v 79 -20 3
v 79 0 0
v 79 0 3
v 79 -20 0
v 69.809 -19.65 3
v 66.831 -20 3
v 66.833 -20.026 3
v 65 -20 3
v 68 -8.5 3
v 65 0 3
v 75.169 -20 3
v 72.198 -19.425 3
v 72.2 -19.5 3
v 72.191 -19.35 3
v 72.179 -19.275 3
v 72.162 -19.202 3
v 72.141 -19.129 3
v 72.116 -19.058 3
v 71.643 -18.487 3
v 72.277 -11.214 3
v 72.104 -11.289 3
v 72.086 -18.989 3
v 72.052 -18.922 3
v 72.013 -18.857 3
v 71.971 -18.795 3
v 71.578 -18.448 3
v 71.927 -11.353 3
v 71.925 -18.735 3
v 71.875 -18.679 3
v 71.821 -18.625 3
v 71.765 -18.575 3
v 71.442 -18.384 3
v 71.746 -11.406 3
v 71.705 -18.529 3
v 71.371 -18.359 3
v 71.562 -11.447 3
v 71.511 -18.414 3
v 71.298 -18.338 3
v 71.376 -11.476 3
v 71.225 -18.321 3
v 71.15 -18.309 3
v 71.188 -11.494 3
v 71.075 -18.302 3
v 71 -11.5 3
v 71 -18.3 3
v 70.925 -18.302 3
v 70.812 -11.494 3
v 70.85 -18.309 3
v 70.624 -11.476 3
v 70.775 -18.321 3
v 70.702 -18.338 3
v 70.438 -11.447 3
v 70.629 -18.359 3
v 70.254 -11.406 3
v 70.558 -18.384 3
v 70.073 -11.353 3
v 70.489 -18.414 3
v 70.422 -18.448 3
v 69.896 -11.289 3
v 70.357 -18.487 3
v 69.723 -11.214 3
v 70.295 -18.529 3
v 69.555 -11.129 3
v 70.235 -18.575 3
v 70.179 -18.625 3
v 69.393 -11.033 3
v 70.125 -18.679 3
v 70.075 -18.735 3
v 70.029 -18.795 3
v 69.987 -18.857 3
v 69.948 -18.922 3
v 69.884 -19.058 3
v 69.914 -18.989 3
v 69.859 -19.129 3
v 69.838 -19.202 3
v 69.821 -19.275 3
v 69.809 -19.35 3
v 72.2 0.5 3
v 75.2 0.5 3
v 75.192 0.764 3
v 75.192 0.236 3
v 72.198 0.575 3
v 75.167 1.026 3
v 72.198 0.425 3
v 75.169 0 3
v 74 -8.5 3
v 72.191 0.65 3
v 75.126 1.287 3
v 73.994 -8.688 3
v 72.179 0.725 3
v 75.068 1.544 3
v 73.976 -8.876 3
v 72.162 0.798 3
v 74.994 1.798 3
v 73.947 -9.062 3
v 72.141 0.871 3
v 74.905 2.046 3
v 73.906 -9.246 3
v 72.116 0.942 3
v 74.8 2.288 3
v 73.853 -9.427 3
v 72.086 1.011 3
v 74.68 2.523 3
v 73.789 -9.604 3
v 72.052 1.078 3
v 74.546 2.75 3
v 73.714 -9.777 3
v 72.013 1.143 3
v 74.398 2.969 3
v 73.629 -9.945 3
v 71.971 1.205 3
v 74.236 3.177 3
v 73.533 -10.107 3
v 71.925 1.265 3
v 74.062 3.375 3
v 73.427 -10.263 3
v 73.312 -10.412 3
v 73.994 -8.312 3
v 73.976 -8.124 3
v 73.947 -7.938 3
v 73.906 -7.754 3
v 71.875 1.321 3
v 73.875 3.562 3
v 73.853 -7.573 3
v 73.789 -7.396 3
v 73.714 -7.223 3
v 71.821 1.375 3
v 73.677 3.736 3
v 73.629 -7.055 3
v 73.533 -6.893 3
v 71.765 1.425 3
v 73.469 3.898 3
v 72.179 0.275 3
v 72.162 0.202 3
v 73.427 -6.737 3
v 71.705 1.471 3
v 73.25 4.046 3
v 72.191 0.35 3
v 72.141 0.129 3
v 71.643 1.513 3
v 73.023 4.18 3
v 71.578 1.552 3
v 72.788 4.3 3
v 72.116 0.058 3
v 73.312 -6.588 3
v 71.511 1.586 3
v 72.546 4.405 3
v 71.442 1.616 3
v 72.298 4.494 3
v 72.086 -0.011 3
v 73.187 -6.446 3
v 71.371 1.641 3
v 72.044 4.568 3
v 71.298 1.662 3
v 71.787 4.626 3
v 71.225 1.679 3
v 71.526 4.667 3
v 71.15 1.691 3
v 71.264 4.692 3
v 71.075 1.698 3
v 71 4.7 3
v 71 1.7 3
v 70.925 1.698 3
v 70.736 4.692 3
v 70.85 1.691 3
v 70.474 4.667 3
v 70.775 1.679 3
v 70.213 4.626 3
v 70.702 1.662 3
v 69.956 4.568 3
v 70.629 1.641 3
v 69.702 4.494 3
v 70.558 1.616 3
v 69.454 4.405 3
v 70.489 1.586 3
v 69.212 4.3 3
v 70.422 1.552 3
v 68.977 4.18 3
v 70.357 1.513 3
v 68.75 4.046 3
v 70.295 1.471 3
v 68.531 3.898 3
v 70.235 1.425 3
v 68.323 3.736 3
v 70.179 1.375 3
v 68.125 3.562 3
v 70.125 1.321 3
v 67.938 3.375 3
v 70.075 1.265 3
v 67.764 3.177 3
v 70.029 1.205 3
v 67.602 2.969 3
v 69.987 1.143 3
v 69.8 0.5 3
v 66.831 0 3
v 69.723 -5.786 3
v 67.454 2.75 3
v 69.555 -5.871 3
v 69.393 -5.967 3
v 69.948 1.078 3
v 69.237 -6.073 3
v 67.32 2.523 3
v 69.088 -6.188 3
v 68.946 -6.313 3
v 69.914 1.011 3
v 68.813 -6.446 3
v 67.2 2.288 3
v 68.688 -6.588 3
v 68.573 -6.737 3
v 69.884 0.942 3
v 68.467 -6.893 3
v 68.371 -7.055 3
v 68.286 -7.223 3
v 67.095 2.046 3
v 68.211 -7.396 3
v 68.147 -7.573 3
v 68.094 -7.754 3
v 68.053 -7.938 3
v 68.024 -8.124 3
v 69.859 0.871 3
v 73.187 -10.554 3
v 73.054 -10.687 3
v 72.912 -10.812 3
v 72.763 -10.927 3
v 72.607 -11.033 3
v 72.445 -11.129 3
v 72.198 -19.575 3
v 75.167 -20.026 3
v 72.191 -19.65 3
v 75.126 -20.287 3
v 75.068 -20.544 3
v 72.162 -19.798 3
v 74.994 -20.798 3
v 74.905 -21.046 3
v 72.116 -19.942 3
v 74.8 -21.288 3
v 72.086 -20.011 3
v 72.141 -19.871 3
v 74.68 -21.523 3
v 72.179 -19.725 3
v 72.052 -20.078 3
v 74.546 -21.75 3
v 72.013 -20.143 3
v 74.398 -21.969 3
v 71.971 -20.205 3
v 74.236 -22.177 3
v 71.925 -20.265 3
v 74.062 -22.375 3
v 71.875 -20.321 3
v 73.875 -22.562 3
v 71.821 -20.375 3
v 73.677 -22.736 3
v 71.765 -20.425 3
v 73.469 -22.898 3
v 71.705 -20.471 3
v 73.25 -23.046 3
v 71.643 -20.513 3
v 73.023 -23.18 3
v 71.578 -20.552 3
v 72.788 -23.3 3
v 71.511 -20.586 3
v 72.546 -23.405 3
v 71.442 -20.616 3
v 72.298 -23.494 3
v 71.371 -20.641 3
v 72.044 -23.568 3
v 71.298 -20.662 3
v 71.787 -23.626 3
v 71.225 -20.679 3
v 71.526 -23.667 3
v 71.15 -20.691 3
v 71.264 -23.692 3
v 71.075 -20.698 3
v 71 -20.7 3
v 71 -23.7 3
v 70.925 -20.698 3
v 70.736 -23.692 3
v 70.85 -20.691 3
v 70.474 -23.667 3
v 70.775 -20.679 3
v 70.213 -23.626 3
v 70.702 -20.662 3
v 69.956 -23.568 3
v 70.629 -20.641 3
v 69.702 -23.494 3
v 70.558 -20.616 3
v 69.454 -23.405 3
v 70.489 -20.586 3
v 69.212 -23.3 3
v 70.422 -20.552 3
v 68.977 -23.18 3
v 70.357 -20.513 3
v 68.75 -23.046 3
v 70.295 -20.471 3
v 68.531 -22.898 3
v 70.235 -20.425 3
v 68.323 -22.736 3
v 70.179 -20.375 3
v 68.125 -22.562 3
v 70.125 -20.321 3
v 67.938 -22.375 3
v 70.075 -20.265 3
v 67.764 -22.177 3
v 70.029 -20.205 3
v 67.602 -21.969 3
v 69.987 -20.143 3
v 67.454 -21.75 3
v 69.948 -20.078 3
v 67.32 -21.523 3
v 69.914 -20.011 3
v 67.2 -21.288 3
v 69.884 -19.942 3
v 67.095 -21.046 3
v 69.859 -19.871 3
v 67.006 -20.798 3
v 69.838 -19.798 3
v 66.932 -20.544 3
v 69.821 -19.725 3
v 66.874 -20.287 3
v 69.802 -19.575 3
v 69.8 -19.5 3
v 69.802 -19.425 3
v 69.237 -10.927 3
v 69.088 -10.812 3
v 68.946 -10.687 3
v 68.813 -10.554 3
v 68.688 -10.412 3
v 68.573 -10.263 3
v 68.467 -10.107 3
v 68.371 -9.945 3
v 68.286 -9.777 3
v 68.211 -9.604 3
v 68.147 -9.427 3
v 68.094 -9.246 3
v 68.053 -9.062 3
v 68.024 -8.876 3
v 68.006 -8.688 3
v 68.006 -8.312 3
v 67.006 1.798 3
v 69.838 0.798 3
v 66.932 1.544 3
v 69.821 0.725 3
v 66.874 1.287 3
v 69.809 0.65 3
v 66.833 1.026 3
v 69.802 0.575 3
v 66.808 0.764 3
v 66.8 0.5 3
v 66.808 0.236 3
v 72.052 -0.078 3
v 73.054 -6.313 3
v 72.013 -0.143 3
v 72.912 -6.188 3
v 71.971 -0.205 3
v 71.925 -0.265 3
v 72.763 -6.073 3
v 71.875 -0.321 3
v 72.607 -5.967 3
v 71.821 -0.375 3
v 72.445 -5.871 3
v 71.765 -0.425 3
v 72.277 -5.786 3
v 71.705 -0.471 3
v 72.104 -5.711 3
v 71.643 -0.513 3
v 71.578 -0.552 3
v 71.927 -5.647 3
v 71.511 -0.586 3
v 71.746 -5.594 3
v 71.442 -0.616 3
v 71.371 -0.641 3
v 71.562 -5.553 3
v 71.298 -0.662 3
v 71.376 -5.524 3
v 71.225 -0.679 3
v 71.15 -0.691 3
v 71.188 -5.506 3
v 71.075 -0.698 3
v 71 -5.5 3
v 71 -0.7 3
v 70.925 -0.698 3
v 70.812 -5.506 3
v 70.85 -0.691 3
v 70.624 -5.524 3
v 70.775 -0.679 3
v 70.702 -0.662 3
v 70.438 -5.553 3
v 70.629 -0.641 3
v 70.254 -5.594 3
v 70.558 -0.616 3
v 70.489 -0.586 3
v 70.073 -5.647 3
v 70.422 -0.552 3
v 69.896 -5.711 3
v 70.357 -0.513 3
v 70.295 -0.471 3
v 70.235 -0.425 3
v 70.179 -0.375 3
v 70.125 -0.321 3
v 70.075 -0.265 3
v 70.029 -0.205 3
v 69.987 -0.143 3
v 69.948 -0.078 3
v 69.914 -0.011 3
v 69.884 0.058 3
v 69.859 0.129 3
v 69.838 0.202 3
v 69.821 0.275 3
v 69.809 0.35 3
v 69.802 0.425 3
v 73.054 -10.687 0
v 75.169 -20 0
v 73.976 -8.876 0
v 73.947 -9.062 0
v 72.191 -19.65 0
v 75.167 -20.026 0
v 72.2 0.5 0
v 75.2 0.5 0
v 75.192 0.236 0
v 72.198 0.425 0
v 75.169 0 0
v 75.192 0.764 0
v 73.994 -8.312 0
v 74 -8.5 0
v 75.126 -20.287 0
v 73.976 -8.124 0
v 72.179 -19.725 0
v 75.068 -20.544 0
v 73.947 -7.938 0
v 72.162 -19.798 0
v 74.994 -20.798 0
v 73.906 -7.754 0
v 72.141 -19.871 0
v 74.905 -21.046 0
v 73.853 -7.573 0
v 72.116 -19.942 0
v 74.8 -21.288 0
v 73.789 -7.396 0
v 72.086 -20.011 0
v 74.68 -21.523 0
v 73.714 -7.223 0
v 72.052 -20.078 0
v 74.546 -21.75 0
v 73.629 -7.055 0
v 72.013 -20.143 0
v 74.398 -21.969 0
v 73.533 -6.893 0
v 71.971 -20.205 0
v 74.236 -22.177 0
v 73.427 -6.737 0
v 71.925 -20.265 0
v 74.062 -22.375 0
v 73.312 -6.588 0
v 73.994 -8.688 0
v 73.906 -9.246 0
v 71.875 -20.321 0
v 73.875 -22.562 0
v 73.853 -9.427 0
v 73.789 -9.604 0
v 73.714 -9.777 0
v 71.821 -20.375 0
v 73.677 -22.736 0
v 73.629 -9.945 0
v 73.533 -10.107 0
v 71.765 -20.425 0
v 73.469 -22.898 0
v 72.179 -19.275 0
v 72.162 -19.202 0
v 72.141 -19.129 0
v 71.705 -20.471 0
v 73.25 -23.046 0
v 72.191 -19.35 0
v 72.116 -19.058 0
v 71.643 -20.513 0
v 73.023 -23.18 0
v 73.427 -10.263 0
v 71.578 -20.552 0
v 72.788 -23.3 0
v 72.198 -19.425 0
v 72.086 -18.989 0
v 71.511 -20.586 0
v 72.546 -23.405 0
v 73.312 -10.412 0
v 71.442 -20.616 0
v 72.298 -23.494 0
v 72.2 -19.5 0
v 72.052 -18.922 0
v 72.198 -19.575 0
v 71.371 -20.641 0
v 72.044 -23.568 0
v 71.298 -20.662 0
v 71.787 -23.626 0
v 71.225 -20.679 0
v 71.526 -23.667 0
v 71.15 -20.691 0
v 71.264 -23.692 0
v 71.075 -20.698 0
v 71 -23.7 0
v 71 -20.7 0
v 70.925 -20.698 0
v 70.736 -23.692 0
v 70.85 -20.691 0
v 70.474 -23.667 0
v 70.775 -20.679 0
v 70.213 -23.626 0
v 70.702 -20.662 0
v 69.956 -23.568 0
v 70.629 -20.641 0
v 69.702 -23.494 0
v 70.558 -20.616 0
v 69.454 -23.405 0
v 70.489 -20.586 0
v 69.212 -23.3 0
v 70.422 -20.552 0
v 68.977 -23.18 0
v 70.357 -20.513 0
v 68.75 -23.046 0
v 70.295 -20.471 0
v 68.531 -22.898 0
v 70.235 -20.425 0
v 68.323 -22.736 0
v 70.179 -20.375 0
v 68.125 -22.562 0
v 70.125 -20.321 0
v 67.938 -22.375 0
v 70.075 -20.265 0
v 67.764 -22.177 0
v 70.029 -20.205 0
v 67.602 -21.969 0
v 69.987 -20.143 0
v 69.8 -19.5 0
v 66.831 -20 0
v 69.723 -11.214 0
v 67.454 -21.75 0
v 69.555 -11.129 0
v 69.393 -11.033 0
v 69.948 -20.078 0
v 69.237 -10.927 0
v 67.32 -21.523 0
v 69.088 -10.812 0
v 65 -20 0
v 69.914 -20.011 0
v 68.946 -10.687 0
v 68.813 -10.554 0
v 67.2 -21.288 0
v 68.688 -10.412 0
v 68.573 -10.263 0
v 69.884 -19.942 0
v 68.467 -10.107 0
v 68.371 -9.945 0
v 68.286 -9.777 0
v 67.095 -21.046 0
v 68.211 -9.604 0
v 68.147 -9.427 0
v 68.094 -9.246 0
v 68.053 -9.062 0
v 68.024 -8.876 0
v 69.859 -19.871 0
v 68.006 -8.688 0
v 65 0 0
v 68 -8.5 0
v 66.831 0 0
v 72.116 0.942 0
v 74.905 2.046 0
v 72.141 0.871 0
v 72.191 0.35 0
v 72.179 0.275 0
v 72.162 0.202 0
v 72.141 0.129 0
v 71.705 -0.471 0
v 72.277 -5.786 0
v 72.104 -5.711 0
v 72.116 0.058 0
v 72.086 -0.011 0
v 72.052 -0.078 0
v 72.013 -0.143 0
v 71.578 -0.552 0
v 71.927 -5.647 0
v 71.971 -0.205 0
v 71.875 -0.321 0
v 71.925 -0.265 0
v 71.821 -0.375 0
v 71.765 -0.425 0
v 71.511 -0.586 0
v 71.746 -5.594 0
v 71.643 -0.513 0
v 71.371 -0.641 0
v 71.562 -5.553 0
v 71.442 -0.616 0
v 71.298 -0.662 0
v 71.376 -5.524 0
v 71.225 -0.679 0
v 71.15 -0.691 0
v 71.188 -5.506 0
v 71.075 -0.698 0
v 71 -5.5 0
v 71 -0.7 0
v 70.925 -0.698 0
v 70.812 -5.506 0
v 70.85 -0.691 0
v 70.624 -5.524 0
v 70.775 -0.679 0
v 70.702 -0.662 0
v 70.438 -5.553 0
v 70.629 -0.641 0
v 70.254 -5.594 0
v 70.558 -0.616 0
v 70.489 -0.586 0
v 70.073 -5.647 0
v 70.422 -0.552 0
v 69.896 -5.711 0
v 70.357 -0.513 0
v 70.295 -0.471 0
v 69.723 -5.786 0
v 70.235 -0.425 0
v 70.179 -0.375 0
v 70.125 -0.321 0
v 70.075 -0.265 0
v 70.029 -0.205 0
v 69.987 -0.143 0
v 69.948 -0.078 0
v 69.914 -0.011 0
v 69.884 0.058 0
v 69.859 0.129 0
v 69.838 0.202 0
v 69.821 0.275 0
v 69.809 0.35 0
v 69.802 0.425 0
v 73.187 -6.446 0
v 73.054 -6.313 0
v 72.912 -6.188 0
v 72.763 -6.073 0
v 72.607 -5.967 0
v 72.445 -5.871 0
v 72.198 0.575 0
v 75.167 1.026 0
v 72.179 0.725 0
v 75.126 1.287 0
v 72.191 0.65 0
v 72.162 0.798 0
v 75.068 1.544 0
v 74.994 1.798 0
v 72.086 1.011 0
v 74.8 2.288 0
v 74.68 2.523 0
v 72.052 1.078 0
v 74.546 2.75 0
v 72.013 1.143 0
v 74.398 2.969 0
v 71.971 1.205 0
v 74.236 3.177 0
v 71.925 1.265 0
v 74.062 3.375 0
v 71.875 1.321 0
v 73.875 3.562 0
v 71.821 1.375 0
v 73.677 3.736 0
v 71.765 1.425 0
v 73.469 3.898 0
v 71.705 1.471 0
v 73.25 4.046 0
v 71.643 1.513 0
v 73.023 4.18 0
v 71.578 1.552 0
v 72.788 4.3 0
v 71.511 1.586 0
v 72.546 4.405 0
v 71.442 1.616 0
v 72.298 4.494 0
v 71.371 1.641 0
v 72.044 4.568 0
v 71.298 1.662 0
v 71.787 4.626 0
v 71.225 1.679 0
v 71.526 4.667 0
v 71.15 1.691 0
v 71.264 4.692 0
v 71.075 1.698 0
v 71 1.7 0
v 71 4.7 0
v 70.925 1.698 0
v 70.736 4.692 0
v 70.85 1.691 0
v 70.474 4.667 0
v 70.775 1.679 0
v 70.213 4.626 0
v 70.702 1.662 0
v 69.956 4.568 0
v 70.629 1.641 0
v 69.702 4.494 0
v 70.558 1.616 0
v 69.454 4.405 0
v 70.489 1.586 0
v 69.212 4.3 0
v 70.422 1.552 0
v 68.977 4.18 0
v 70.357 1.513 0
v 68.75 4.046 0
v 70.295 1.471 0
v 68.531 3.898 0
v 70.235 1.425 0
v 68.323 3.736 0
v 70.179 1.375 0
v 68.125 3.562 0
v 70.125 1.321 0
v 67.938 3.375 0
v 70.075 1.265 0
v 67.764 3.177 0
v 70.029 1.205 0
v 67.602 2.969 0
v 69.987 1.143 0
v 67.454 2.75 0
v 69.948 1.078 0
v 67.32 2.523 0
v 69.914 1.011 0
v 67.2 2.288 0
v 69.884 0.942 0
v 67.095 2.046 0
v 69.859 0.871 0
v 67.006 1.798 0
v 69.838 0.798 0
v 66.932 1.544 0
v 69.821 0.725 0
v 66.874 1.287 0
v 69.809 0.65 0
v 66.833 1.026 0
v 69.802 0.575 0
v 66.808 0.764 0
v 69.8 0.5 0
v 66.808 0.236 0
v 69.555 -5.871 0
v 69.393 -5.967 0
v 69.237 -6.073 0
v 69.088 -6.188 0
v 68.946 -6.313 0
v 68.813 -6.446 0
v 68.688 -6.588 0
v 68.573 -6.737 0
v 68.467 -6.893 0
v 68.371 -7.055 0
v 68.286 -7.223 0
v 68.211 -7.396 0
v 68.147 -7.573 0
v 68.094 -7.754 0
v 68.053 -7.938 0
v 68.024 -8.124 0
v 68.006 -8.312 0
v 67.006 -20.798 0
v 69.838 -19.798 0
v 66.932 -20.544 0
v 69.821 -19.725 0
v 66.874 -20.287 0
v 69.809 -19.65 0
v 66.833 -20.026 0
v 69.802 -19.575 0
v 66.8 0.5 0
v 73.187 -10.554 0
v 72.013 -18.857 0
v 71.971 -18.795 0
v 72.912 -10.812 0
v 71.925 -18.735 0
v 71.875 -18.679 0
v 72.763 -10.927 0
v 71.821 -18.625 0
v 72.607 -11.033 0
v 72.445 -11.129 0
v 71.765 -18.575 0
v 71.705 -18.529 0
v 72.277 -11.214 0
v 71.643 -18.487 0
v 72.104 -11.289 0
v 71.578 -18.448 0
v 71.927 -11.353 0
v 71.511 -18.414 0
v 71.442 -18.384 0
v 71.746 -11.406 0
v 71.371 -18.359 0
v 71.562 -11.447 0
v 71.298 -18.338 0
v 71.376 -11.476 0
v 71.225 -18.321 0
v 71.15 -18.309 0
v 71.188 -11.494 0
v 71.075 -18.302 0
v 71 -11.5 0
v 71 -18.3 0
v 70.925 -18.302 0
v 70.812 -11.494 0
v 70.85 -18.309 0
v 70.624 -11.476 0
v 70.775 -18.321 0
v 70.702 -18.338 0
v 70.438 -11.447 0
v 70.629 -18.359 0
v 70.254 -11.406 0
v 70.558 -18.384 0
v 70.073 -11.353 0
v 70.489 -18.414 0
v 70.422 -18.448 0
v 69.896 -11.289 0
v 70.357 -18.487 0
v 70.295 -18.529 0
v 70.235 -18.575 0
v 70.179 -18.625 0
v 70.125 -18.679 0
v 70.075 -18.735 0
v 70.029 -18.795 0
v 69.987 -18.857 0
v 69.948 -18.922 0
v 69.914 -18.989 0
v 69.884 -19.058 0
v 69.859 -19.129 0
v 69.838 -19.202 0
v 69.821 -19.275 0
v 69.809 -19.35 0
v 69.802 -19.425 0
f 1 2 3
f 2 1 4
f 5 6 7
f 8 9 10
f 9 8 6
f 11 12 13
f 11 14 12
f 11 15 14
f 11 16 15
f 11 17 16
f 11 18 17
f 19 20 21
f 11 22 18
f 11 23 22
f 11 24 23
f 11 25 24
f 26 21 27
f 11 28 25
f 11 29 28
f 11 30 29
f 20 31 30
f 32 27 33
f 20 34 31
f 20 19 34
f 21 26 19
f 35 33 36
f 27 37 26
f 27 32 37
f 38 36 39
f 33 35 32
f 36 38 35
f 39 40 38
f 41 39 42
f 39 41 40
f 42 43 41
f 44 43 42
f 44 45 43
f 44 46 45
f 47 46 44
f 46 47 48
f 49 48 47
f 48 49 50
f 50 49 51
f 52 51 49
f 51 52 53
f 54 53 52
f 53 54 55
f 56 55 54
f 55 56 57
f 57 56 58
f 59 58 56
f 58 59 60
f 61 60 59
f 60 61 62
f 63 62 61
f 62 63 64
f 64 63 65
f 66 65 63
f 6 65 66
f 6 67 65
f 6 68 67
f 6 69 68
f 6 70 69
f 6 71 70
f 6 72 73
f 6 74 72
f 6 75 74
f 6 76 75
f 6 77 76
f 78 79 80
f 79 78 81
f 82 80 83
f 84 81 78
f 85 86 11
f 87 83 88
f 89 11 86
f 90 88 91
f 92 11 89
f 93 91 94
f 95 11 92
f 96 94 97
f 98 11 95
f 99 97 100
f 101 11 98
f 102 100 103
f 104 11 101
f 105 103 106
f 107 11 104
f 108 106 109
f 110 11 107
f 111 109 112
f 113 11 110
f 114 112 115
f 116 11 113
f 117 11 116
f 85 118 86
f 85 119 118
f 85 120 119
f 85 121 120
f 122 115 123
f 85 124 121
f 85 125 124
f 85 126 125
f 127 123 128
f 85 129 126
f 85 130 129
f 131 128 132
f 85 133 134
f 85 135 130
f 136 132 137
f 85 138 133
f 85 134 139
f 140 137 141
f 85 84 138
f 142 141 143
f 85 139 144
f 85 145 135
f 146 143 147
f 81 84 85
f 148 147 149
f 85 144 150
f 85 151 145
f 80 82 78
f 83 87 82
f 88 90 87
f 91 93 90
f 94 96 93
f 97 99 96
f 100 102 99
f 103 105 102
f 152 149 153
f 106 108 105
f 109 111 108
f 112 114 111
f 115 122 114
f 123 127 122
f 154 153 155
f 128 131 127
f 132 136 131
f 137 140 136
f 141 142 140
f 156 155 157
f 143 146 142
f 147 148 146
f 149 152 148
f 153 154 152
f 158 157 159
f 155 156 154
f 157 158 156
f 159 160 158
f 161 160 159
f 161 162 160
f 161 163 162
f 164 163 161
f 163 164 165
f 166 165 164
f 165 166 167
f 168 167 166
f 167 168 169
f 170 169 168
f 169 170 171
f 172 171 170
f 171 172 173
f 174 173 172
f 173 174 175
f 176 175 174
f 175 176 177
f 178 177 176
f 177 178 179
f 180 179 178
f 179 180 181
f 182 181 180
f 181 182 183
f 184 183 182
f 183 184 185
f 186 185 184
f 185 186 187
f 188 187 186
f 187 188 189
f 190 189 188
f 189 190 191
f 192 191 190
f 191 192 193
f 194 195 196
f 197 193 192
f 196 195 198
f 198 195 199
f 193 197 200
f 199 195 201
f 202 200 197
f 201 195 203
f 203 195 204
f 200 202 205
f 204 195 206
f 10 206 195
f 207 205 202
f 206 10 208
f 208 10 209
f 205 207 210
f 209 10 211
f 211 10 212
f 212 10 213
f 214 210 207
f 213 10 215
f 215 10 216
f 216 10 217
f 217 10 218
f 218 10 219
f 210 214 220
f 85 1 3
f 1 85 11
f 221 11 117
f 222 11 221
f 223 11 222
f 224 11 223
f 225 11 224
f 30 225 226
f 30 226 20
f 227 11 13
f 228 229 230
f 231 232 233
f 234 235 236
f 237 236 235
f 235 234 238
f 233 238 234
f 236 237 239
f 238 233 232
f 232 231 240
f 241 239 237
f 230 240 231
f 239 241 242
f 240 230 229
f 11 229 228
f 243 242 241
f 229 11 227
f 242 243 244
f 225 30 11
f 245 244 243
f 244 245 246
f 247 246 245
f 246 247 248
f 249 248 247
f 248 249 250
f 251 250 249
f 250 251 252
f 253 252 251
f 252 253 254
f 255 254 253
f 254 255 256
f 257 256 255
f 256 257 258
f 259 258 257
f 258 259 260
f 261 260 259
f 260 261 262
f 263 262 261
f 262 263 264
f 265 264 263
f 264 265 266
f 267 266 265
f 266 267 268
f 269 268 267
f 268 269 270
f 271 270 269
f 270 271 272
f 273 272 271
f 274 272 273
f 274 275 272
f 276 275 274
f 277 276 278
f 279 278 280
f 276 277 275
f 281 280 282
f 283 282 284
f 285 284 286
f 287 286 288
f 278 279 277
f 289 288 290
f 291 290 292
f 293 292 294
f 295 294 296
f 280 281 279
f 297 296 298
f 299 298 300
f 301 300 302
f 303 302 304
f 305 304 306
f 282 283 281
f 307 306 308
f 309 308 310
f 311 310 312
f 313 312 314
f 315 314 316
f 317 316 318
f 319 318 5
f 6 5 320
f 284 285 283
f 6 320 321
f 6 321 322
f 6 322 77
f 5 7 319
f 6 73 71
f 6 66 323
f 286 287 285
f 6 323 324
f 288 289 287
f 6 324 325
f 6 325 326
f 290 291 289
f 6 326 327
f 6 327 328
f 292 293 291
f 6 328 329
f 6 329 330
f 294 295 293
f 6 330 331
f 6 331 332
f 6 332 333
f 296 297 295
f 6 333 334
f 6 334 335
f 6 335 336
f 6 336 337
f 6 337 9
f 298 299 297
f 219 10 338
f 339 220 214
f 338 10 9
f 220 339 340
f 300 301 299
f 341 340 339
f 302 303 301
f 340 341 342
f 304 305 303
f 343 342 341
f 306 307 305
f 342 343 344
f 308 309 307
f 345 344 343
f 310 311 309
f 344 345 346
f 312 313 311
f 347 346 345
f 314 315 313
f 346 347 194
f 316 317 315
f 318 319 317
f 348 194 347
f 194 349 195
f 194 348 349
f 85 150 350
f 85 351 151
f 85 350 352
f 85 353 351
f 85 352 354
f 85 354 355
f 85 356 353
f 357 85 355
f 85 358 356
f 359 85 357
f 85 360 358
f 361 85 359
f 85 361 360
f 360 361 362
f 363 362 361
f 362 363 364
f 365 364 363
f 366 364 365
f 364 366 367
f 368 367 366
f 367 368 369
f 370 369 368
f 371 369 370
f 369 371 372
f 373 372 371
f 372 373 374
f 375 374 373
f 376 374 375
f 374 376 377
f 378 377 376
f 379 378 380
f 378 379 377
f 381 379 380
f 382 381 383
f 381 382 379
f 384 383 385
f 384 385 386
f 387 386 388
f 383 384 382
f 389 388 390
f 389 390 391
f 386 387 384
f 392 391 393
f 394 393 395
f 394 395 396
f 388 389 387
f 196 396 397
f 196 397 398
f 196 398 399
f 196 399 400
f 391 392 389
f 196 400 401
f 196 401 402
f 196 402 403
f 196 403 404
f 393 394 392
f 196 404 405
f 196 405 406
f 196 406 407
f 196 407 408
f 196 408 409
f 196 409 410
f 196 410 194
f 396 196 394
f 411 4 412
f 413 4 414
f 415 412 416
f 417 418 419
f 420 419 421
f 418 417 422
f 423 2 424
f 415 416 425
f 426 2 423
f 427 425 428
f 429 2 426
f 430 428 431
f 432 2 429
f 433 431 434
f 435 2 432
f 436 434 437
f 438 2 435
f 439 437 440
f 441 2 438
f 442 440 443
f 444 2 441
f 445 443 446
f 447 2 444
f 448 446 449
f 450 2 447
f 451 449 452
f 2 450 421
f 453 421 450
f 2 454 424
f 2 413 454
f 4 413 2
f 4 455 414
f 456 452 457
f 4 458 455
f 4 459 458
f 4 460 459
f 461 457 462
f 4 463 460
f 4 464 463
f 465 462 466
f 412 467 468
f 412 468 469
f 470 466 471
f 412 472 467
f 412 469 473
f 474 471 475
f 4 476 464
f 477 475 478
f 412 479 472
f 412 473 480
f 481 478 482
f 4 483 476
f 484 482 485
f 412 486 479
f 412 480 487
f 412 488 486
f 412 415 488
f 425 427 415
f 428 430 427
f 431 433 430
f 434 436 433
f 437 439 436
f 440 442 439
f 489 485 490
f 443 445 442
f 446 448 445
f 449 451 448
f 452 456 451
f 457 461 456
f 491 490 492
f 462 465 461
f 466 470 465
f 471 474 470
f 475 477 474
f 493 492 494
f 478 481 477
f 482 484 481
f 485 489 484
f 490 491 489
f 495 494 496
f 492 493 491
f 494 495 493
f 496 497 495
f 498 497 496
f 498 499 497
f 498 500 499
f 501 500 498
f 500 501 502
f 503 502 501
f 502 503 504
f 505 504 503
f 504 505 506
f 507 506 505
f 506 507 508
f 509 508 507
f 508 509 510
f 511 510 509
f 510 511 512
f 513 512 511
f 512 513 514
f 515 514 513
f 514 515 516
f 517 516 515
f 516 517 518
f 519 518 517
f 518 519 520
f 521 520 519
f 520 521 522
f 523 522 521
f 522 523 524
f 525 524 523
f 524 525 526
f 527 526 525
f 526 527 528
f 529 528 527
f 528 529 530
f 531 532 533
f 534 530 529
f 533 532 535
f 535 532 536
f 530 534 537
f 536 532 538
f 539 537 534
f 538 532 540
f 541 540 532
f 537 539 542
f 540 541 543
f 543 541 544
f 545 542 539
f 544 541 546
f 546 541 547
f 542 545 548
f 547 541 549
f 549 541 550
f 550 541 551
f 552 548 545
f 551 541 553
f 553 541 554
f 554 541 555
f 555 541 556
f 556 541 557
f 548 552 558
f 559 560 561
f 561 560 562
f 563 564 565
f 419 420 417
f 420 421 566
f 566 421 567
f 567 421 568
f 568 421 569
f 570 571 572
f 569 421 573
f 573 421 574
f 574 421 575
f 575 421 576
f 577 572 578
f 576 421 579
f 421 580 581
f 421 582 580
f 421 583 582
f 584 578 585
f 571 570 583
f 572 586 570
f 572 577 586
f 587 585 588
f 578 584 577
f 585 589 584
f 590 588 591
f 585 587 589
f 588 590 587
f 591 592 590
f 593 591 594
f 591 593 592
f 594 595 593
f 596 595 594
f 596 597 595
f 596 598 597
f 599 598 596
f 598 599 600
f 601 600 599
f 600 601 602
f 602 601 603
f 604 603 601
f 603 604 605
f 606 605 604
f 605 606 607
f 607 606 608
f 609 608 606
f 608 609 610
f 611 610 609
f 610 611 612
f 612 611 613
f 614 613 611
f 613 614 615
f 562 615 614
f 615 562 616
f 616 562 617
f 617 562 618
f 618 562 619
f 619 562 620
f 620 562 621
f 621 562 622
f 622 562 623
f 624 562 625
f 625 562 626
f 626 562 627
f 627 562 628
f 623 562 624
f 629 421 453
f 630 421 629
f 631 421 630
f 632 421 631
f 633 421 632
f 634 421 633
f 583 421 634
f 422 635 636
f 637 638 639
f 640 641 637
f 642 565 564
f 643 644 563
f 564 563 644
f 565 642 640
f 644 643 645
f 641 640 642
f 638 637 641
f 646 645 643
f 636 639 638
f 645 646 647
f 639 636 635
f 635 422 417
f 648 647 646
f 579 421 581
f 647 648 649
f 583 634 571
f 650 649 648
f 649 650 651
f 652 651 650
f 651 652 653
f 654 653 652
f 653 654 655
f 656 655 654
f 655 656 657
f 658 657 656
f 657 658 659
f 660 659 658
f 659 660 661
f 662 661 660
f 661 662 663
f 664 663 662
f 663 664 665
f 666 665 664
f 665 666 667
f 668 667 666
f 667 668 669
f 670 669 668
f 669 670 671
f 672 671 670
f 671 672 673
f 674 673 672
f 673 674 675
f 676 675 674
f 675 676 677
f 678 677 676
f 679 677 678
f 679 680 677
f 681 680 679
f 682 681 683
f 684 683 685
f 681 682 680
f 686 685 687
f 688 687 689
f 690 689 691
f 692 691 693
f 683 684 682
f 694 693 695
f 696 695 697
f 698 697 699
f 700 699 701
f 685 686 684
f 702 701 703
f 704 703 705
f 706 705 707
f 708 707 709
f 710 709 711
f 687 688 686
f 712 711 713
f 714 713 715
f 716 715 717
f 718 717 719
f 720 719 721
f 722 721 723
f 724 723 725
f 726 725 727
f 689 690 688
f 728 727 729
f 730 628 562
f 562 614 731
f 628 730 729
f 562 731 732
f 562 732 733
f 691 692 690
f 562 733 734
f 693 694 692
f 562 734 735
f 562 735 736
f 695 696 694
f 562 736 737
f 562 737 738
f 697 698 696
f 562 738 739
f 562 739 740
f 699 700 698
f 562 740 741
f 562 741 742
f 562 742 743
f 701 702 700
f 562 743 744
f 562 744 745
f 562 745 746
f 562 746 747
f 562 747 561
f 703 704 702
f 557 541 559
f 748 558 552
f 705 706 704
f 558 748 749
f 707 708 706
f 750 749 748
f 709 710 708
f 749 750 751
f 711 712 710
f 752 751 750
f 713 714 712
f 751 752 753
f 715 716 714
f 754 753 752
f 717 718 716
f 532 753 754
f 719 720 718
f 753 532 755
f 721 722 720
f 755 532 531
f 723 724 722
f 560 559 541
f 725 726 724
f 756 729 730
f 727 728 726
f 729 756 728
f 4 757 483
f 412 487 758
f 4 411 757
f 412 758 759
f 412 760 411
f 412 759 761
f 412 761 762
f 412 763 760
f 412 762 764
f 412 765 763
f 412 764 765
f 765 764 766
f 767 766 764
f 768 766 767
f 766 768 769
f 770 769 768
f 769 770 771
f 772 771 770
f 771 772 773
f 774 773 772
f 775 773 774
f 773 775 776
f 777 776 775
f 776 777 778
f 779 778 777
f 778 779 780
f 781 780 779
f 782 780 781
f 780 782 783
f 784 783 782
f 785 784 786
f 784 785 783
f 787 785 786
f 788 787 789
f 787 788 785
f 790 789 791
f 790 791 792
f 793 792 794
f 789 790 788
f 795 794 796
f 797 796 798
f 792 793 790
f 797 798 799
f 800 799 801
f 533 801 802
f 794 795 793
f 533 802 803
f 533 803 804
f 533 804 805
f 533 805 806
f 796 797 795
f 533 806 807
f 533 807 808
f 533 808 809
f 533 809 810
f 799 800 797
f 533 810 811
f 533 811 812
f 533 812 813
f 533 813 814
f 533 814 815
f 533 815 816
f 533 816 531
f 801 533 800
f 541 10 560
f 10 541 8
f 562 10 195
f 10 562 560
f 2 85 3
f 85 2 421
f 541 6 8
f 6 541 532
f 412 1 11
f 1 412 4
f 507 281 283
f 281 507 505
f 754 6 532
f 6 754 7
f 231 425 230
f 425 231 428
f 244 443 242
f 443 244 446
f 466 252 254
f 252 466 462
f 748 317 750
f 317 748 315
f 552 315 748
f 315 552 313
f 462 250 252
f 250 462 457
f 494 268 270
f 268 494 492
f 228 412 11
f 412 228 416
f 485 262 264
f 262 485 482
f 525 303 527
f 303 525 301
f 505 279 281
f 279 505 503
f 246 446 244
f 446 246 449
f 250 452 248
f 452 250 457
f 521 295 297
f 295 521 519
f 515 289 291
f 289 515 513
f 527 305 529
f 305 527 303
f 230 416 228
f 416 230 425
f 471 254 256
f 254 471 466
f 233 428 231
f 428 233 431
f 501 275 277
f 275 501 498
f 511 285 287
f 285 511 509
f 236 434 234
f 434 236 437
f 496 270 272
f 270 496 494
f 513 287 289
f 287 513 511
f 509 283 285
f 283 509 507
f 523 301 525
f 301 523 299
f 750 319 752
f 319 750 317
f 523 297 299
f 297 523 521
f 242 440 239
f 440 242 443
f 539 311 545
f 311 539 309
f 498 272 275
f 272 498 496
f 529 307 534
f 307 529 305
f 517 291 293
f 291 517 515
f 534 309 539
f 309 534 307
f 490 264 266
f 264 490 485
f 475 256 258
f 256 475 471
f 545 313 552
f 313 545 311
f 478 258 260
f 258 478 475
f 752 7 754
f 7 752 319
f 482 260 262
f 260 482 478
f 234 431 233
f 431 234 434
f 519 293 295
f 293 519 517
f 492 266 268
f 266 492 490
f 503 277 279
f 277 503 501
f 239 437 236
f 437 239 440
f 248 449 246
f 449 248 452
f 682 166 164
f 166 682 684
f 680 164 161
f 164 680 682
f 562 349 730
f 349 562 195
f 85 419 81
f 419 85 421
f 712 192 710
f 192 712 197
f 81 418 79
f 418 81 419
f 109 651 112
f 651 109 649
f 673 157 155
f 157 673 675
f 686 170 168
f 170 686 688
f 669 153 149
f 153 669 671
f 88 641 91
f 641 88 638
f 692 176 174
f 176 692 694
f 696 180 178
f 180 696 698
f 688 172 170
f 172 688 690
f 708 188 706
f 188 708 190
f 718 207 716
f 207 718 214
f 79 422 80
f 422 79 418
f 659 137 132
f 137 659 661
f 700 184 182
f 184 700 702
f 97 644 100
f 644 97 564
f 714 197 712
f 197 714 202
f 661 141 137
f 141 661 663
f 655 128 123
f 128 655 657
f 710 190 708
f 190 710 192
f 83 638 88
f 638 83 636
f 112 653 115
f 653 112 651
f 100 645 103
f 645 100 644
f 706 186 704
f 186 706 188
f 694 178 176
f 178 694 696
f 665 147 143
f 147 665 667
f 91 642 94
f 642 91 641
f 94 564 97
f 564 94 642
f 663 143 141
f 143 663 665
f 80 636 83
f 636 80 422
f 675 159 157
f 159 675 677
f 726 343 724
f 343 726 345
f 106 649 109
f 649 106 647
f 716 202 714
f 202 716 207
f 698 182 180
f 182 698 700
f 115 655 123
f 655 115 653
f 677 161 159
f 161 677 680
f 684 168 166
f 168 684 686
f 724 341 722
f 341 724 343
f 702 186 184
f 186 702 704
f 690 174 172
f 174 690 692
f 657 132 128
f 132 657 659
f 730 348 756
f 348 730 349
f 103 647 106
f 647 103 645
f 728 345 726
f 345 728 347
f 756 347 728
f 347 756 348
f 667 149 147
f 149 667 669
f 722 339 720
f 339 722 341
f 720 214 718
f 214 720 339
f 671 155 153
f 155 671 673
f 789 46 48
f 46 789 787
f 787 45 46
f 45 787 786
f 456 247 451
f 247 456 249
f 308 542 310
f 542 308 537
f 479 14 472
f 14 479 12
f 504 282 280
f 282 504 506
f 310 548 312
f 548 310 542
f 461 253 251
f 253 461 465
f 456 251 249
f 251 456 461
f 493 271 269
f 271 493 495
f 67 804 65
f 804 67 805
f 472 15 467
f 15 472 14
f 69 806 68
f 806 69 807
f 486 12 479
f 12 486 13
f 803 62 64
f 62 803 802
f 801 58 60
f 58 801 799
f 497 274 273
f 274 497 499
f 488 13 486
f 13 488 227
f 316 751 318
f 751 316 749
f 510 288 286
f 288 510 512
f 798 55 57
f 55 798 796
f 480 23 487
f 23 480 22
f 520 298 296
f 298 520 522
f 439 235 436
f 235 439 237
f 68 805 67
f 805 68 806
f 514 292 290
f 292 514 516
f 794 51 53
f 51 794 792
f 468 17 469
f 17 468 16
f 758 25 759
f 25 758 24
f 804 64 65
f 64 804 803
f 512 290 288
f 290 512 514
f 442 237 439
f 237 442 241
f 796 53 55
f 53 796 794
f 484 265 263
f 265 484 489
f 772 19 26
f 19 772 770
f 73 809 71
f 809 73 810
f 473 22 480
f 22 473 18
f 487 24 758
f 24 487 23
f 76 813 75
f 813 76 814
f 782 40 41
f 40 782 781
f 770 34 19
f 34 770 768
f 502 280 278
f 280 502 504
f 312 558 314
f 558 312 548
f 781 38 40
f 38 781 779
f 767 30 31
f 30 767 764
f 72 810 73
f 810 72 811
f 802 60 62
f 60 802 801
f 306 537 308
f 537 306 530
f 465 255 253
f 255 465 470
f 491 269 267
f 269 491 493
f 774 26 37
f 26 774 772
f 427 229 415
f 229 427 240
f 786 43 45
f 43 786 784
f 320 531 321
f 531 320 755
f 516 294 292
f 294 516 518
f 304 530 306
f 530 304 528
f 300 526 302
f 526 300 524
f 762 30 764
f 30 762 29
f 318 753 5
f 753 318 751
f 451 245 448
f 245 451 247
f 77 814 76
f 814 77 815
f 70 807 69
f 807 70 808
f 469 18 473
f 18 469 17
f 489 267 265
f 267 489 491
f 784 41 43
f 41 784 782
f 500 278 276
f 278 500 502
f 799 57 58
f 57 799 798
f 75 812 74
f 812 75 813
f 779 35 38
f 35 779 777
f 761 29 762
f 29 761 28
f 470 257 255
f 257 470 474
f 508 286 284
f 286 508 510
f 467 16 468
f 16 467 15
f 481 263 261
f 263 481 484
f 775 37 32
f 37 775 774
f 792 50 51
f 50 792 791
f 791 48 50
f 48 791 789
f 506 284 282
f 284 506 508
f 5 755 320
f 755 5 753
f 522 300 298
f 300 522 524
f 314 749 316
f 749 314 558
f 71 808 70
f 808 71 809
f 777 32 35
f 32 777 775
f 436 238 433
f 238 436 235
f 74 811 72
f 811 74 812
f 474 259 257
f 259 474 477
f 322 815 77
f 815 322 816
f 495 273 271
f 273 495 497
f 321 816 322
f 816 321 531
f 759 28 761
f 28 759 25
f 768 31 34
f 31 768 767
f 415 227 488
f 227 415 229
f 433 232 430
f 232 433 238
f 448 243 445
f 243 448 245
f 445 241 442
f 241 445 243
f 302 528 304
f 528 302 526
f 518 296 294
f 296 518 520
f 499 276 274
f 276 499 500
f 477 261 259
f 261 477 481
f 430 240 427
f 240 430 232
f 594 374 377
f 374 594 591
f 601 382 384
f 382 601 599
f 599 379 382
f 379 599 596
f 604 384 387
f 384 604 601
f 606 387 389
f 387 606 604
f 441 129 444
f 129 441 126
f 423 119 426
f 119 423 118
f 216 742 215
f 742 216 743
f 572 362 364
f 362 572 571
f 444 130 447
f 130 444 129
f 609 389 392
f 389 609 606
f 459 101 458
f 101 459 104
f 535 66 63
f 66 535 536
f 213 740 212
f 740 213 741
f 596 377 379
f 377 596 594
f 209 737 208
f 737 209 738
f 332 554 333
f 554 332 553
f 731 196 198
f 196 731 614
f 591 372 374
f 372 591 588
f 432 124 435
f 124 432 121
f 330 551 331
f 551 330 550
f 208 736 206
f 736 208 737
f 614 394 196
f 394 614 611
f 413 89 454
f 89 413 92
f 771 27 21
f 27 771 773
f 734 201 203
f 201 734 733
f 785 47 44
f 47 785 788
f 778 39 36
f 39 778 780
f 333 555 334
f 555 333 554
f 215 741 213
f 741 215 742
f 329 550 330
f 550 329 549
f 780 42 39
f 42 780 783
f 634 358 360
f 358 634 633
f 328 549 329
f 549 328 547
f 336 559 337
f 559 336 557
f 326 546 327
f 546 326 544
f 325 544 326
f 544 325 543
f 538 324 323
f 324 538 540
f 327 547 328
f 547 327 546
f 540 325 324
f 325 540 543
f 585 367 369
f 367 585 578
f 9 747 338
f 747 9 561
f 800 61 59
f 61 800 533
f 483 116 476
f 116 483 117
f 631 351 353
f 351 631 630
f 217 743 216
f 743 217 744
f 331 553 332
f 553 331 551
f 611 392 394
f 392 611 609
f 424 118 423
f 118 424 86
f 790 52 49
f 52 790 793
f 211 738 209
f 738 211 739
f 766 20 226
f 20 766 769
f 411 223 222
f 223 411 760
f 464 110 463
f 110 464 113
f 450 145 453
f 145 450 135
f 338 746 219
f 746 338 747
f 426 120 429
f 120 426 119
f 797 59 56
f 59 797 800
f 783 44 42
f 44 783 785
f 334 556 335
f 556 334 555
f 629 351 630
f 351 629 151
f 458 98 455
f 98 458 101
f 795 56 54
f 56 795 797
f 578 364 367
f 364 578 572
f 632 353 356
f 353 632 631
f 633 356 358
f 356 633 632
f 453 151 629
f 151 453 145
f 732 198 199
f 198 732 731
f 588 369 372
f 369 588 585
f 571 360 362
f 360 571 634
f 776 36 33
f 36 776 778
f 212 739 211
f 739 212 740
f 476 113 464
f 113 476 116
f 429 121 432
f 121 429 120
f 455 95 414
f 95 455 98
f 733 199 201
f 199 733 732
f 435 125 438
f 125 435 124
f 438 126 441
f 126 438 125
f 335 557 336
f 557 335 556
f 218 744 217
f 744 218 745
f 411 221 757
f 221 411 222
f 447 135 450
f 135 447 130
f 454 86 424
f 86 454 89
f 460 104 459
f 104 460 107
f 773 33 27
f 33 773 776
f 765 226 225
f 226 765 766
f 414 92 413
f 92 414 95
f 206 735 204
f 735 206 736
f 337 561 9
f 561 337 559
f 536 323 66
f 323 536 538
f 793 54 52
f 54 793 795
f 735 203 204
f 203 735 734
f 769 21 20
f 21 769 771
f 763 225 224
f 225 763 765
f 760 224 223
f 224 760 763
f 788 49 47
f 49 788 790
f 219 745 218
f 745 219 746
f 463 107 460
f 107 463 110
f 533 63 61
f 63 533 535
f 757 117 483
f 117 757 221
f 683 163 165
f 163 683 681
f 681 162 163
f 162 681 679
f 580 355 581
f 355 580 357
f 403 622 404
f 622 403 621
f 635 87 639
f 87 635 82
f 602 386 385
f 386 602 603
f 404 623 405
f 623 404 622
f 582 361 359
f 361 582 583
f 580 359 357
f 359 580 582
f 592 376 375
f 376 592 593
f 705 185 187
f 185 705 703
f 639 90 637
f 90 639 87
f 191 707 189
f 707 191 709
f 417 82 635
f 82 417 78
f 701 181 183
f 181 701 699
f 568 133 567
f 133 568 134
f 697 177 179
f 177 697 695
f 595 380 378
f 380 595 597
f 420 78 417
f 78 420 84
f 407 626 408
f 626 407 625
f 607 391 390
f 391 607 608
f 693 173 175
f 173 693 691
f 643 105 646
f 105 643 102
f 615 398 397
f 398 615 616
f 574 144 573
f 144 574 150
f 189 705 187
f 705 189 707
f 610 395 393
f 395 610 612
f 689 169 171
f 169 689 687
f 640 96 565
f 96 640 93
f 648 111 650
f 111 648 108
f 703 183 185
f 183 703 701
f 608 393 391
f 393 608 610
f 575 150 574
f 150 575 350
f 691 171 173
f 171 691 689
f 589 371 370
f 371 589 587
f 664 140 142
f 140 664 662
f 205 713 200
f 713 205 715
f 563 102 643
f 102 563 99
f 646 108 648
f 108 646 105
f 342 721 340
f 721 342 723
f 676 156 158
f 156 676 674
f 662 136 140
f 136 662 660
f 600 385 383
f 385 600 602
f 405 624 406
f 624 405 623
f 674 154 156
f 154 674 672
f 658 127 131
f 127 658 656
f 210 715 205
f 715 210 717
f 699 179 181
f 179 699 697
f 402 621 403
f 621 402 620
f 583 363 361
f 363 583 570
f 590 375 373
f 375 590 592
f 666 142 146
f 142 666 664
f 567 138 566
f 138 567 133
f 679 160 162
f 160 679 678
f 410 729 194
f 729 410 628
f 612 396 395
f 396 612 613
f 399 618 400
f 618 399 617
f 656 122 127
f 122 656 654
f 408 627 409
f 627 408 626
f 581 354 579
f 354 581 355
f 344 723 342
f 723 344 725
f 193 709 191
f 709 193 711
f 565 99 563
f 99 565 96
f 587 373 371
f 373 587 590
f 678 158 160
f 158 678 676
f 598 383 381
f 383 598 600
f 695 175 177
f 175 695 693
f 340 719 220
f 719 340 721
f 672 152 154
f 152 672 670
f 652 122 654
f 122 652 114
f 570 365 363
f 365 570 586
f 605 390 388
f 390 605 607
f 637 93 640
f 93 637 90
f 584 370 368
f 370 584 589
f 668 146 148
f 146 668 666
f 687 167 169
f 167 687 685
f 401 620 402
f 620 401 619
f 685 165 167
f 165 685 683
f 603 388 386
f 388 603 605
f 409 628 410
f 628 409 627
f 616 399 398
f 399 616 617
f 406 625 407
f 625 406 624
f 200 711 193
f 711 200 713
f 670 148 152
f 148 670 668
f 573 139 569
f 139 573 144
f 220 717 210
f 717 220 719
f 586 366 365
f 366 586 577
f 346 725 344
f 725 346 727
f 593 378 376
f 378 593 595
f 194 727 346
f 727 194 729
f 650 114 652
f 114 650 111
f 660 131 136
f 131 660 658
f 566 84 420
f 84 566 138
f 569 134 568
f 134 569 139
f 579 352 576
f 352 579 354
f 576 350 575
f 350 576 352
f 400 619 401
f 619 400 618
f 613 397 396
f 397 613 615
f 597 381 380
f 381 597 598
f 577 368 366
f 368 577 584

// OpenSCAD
difference(){
	union(){

        translate([-2+67,-20,0]){
           cube([14,20,3], center=false);
        }
        translate([4+67,24-52+6.5+2,0]){
            rotate([0,0,90]){
                cylinder(h=3, r=4.2, $fn=100, center=false);
            }
        }        
        translate([4+67,24-52+6.5+2+20,0]){
            rotate([0,0,90]){
                cylinder(h=3, r=4.2, $fn=100, center=false);
            }
        }        

        
	}
	union() {

        translate([4+67,24-52+6.5+2,-1]){
            rotate([0,0,90]){
                cylinder(h=38, r=1.2, $fn=100, center=false);
            }
        }        

        translate([4+67,24-52+6.5+2+11,-1]){
            rotate([0,0,90]){
                cylinder(h=38, r=3, $fn=100, center=false);
            }
        }        


        translate([4+67,24-52+6.5+2+20,-1]){
            rotate([0,0,90]){
                cylinder(h=38, r=1.2, $fn=100, center=false);
            }
        }        
        

	}
}
